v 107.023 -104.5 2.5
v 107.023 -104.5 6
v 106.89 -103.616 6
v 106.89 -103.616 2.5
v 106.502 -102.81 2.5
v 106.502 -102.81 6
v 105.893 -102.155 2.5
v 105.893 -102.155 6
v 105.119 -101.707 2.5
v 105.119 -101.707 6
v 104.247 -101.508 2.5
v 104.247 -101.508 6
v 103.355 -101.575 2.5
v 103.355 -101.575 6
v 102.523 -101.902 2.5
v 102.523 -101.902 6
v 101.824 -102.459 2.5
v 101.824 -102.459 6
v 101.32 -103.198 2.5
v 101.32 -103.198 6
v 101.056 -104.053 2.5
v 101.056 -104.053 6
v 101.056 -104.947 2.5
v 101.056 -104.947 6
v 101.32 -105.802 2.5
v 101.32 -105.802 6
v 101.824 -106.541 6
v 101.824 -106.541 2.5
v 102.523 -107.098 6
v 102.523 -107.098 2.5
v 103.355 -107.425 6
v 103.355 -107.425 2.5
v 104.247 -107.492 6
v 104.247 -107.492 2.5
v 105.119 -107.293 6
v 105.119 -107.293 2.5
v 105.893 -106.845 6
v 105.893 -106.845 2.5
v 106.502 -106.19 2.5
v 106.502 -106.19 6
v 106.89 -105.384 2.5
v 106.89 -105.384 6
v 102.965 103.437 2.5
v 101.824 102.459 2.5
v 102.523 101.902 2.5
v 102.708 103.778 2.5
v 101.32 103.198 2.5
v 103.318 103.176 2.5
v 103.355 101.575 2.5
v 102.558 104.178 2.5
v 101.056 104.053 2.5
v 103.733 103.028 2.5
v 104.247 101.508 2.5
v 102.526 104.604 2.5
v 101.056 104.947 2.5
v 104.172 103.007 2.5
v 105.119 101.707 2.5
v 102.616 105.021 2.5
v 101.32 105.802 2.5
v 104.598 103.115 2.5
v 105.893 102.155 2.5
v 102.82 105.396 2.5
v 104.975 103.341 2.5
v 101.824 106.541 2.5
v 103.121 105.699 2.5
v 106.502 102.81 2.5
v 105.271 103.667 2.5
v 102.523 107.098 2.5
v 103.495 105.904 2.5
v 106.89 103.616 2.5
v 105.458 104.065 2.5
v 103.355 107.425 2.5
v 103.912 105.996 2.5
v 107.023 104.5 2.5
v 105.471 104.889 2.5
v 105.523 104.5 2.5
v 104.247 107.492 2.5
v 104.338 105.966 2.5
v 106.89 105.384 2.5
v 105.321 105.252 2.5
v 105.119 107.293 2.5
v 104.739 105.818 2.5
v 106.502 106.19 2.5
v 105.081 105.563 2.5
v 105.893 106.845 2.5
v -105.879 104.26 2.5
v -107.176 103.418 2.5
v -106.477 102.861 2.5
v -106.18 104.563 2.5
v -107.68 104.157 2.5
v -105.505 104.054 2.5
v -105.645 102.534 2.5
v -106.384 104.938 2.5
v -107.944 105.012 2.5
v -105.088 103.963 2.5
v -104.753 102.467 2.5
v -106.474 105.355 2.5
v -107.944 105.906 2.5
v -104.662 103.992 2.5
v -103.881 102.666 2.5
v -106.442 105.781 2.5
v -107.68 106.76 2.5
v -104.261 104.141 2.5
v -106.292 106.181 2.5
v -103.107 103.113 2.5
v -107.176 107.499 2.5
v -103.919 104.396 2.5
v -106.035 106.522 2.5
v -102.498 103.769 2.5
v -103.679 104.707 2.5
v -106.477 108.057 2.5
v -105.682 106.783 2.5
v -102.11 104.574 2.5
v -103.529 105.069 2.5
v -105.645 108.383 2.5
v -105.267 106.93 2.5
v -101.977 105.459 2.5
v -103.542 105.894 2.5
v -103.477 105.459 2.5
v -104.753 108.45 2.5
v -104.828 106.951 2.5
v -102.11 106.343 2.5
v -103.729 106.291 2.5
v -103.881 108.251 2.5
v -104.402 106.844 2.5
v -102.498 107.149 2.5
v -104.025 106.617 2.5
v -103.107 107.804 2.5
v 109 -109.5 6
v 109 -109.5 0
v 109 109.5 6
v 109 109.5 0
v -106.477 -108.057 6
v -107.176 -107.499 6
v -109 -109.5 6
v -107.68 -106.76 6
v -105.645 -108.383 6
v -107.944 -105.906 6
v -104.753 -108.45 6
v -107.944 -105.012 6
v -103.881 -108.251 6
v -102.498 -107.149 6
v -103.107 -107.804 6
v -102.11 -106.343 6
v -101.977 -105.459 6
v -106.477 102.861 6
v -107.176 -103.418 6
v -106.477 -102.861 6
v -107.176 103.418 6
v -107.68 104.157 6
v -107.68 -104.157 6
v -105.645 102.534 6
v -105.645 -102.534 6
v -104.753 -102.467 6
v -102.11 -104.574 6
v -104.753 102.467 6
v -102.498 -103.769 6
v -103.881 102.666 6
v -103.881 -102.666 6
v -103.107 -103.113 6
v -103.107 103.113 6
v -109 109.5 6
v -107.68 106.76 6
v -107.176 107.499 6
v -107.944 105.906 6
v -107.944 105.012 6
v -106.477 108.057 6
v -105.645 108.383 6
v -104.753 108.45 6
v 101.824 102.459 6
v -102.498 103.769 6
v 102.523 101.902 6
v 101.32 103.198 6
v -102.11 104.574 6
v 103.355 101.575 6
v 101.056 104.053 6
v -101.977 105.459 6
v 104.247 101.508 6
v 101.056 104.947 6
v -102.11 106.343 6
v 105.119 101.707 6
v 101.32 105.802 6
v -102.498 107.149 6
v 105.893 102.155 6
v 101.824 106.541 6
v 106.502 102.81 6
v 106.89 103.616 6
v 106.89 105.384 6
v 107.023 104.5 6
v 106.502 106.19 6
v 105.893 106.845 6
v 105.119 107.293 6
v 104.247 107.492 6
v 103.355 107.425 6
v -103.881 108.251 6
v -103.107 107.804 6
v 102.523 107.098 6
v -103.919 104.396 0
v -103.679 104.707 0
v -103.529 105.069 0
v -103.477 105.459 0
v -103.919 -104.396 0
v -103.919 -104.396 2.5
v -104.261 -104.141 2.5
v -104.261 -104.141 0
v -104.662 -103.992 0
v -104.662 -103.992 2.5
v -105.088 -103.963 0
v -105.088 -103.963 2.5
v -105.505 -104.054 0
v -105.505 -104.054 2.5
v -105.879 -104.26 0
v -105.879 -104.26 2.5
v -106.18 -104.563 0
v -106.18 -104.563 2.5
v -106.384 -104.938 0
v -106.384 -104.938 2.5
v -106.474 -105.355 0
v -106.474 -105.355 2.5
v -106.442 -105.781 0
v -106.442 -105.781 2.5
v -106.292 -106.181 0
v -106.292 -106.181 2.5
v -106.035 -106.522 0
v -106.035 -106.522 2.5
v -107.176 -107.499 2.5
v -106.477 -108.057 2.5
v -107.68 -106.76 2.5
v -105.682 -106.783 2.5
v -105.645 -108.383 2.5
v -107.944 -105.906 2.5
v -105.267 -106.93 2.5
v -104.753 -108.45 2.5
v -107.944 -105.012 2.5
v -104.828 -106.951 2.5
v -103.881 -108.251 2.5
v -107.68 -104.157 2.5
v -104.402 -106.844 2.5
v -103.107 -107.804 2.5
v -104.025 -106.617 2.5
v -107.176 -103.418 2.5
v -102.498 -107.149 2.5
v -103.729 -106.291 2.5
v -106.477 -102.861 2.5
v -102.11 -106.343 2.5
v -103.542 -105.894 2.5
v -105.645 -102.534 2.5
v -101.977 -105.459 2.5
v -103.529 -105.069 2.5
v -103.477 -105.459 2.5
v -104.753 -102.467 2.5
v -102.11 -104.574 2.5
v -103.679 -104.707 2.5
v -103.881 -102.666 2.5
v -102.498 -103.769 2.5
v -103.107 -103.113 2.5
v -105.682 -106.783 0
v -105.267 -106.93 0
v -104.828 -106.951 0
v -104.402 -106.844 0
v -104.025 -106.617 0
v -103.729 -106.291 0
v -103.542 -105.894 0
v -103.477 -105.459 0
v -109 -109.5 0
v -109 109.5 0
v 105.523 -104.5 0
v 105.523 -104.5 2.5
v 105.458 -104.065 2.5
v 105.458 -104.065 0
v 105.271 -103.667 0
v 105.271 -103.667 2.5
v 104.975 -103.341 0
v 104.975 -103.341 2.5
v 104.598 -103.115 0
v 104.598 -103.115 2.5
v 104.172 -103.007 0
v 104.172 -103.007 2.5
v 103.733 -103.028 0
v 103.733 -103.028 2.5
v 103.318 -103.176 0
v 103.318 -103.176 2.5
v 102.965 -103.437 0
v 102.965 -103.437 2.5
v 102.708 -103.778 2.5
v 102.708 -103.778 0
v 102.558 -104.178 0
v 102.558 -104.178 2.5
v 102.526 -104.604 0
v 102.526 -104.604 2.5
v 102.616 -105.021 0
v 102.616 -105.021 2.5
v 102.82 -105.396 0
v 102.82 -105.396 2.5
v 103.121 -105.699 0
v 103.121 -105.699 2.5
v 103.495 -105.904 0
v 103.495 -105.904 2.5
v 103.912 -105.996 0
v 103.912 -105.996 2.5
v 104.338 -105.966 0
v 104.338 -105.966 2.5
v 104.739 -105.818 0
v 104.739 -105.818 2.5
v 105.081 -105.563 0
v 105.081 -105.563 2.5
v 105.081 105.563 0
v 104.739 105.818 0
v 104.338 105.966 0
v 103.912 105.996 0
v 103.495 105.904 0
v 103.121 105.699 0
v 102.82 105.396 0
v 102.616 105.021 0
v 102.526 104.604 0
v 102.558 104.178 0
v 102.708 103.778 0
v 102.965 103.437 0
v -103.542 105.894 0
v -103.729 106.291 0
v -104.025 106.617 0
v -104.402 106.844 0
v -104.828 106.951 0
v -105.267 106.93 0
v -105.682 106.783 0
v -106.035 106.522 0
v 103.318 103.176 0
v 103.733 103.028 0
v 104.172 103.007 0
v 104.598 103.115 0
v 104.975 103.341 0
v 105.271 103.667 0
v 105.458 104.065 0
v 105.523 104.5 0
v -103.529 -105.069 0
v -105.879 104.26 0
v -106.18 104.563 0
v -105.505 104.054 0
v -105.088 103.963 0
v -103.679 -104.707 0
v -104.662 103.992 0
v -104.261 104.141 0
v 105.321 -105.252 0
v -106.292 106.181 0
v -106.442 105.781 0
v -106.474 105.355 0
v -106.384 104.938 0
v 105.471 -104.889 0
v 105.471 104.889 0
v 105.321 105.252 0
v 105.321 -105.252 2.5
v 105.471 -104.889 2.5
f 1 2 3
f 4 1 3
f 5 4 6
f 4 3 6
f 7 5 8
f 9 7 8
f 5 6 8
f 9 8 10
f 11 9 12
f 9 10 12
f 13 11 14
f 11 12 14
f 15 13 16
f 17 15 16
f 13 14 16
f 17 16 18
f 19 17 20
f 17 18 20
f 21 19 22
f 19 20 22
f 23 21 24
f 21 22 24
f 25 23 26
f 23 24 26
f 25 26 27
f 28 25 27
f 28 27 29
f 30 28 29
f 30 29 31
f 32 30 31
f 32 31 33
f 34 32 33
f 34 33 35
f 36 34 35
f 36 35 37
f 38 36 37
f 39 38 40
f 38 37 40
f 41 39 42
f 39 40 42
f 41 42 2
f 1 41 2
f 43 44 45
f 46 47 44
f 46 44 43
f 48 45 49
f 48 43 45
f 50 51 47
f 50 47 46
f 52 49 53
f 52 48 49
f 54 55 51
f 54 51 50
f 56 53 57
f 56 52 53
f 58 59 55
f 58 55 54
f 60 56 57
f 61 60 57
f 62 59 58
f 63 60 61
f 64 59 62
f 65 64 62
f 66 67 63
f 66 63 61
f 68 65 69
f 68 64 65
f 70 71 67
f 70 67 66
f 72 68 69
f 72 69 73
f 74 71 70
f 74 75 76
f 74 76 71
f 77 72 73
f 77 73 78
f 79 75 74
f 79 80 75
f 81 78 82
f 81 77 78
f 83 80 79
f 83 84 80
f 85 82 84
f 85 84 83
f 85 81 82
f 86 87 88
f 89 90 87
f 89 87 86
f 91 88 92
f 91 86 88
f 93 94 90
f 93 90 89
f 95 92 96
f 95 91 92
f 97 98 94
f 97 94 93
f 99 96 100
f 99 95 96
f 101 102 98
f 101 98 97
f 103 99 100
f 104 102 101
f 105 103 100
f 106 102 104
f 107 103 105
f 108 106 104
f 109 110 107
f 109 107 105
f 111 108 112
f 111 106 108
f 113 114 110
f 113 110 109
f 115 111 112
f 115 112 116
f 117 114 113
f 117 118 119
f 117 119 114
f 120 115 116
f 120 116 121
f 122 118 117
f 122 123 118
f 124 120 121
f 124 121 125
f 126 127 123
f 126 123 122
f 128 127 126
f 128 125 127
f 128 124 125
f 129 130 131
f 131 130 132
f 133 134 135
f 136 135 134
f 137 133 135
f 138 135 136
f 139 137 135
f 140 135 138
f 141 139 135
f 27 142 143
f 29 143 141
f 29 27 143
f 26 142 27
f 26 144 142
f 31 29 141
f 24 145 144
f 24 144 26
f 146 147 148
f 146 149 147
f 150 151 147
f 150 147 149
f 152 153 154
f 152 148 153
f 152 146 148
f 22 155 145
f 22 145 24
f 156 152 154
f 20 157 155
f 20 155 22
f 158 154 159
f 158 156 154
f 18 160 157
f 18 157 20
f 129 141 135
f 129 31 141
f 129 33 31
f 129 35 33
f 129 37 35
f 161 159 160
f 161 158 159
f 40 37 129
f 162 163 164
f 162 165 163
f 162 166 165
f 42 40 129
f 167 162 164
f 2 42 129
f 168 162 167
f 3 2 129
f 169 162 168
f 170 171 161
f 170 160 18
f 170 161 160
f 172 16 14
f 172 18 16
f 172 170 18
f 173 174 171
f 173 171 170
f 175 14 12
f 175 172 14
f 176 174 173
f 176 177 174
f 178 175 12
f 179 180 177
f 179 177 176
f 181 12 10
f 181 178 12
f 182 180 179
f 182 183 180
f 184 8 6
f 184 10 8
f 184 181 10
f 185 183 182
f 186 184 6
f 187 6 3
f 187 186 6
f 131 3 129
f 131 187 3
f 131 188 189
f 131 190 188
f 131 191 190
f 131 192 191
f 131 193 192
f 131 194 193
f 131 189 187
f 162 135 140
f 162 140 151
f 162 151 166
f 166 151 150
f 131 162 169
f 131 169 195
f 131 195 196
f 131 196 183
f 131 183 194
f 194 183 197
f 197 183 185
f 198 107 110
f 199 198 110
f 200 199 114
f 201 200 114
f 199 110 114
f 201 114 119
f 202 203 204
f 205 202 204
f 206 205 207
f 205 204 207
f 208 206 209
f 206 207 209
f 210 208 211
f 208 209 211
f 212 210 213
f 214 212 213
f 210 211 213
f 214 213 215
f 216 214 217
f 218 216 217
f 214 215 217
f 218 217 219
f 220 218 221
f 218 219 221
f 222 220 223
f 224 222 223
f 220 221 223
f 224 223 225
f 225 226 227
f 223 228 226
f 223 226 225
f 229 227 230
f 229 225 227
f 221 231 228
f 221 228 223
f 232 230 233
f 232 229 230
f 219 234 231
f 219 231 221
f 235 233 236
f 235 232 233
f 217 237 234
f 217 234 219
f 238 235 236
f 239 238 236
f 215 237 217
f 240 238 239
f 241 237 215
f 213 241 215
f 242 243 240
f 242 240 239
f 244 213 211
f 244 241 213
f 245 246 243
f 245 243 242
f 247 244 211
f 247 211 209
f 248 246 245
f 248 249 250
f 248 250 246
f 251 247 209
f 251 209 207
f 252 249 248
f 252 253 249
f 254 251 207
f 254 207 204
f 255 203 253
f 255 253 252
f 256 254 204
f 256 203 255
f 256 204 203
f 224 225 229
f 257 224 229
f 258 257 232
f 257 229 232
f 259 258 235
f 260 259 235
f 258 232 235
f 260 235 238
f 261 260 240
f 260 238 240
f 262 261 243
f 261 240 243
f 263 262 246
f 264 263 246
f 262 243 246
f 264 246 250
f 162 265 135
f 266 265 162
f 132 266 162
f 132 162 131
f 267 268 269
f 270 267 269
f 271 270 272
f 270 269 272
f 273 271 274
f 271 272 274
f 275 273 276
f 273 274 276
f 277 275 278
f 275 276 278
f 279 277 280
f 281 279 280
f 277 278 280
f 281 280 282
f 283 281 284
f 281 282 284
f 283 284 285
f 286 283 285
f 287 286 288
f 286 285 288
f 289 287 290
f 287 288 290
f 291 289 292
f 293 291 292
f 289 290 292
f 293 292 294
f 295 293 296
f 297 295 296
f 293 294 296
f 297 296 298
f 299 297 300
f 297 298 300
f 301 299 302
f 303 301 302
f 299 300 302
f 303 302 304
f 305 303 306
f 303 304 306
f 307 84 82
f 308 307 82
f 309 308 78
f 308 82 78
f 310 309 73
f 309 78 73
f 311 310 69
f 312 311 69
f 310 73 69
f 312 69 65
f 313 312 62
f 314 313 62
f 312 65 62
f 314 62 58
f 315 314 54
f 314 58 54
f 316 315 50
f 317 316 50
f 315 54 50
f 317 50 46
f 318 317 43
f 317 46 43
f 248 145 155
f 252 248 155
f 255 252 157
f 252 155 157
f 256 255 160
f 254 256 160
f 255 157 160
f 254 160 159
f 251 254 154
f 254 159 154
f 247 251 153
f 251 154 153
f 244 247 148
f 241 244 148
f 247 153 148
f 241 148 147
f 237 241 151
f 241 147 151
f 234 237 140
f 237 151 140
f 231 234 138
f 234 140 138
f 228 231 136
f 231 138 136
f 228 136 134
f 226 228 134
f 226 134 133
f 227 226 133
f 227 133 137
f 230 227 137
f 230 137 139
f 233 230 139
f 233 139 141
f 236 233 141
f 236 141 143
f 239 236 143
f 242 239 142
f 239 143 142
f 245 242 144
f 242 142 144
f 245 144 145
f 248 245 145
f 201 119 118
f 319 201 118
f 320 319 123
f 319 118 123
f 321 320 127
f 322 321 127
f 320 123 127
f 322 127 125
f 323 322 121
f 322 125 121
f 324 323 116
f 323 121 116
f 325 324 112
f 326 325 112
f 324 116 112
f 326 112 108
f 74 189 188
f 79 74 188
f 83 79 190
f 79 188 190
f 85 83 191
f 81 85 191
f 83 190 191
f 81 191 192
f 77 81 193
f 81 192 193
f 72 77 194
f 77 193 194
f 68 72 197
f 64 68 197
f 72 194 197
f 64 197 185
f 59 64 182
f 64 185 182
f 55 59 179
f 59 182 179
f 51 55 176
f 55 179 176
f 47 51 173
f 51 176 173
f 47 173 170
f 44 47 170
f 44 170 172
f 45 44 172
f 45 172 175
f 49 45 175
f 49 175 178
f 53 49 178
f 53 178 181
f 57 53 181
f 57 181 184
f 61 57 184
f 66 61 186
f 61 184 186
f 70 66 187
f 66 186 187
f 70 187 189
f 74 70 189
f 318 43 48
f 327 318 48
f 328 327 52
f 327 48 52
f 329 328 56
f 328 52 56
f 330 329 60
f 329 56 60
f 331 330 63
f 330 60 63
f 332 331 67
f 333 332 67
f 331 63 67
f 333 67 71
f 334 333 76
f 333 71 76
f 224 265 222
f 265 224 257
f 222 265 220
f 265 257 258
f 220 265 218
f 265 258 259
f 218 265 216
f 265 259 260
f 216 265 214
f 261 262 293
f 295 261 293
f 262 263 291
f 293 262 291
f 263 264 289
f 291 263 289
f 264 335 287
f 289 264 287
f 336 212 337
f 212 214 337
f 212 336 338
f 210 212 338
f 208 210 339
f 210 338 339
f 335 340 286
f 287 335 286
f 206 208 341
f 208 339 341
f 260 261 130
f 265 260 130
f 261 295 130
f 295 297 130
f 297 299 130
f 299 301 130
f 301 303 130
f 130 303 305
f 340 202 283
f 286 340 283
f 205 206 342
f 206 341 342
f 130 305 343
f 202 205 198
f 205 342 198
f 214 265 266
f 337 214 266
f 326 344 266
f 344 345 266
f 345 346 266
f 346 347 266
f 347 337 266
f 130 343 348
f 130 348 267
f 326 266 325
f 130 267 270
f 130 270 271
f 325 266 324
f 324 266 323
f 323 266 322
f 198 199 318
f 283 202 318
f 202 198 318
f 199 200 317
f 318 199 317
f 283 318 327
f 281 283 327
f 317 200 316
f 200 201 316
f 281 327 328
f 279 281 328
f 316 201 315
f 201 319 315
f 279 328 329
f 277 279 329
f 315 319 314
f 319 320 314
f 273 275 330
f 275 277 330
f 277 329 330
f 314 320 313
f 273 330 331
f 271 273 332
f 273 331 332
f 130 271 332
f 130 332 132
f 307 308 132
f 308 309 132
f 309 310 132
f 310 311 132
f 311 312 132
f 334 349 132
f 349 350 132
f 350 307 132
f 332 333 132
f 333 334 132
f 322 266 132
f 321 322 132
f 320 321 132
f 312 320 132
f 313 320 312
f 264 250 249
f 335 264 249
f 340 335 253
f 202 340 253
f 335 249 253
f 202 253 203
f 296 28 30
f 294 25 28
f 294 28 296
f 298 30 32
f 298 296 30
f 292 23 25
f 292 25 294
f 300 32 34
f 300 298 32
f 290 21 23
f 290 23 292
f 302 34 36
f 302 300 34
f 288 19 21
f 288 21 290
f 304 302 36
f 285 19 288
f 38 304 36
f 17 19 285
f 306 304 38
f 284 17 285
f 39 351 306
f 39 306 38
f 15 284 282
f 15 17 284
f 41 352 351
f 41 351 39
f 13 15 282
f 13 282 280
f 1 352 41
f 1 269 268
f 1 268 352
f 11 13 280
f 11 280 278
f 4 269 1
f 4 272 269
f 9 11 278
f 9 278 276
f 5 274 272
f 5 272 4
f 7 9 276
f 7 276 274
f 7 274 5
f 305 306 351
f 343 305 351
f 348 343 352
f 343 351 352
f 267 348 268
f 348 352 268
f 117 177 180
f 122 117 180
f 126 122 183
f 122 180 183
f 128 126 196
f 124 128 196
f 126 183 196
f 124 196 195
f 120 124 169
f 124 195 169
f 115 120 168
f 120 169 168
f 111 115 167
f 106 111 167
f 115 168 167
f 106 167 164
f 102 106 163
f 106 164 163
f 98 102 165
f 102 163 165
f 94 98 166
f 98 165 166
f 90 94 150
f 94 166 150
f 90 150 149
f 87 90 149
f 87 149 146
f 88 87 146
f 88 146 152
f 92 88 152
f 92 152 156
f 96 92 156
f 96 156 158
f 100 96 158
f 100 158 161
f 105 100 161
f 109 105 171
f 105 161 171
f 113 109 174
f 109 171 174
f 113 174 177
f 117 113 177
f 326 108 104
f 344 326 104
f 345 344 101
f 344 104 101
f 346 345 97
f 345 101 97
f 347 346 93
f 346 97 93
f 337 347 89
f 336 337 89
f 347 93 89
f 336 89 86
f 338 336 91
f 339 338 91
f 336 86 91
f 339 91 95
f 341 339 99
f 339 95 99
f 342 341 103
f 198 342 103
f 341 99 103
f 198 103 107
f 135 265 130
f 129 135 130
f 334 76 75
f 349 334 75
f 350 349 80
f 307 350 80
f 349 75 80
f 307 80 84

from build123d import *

# Parameters (mm, degrees)
F0_W     = 218
F0_H     = 219
F1_DEPTH = 6
F3_DEPTH = 6
F4_R     = 3
F5_DEPTH = 3.5


with BuildPart() as f1:
    # F0 (on Top) → F1 (new body)
    with BuildSketch(Plane.XY):
        Rectangle(F0_W, F0_H)
    extrude(amount=F1_DEPTH)

    # F2 (on face) → F3 (cut, through all)
    with BuildSketch(Plane.XY.offset(6)):
        with BuildLine():
            ThreePointArc((-103.477169, 105.458716), (-104.401559, 106.843877), (-106.035399, 106.5218))
            Line((-106.035399, 106.5218), (-103.918939, 104.395631))
            ThreePointArc((-103.918939, 104.395631), (-103.592007, 104.883105), (-103.477169, 105.458716))
        make_face()
        with BuildLine():
            ThreePointArc((105.081061, 105.563085), (102.959747, 105.55823), (102.964601, 103.436915))
            Line((102.964601, 103.436915), (105.081061, 105.563085))
        make_face()
        with BuildLine():
            Line((105.081061, 105.563085), (102.964601, 103.436915))
            ThreePointArc((102.964601, 103.436915), (104.598441, 103.114838), (105.522831, 104.5))
            ThreePointArc((105.522831, 104.5), (105.407993, 105.07561), (105.081061, 105.563085))
        make_face()
        with BuildLine():
            ThreePointArc((105.522831, -104.5), (104.598441, -103.114838), (102.964601, -103.436915))
            Line((102.964601, -103.436915), (105.081061, -105.563085))
            ThreePointArc((105.081061, -105.563085), (105.407993, -105.07561), (105.522831, -104.5))
        make_face()
        with BuildLine():
            Line((105.081061, -105.563085), (102.964601, -103.436915))
            ThreePointArc((102.964601, -103.436915), (102.959747, -105.55823), (105.081061, -105.563085))
        make_face()
        with BuildLine():
            ThreePointArc((-103.477169, -105.458716), (-103.592007, -104.883105), (-103.918939, -104.395631))
            Line((-103.918939, -104.395631), (-106.035399, -106.5218))
            ThreePointArc((-106.035399, -106.5218), (-104.401559, -106.843877), (-103.477169, -105.458716))
        make_face()
        with BuildLine():
            Line((-106.035399, -106.5218), (-103.918939, -104.395631))
            ThreePointArc((-103.918939, -104.395631), (-106.040253, -104.400485), (-106.035399, -106.5218))
        make_face()
        with BuildLine():
            Line((-103.918939, 104.395631), (-106.035399, 106.5218))
            ThreePointArc((-106.035399, 106.5218), (-106.040253, 104.400485), (-103.918939, 104.395631))
        make_face()
    extrude(amount=-F3_DEPTH, mode=Mode.SUBTRACT)

    # F4 (on face) → F5 (cut)
    with BuildSketch(Plane.XY.offset(6)):
        with Locations((-104.977169, 105.458716)):
            Circle(F4_R)
        with Locations((104.022831, 104.5)):
            Circle(F4_R)
        with Locations((104.022831, -104.5)):
            Circle(F4_R)
        with Locations((-104.977169, -105.458716)):
            Circle(F4_R)
    extrude(amount=-F5_DEPTH, mode=Mode.SUBTRACT)


solid = f1.part
